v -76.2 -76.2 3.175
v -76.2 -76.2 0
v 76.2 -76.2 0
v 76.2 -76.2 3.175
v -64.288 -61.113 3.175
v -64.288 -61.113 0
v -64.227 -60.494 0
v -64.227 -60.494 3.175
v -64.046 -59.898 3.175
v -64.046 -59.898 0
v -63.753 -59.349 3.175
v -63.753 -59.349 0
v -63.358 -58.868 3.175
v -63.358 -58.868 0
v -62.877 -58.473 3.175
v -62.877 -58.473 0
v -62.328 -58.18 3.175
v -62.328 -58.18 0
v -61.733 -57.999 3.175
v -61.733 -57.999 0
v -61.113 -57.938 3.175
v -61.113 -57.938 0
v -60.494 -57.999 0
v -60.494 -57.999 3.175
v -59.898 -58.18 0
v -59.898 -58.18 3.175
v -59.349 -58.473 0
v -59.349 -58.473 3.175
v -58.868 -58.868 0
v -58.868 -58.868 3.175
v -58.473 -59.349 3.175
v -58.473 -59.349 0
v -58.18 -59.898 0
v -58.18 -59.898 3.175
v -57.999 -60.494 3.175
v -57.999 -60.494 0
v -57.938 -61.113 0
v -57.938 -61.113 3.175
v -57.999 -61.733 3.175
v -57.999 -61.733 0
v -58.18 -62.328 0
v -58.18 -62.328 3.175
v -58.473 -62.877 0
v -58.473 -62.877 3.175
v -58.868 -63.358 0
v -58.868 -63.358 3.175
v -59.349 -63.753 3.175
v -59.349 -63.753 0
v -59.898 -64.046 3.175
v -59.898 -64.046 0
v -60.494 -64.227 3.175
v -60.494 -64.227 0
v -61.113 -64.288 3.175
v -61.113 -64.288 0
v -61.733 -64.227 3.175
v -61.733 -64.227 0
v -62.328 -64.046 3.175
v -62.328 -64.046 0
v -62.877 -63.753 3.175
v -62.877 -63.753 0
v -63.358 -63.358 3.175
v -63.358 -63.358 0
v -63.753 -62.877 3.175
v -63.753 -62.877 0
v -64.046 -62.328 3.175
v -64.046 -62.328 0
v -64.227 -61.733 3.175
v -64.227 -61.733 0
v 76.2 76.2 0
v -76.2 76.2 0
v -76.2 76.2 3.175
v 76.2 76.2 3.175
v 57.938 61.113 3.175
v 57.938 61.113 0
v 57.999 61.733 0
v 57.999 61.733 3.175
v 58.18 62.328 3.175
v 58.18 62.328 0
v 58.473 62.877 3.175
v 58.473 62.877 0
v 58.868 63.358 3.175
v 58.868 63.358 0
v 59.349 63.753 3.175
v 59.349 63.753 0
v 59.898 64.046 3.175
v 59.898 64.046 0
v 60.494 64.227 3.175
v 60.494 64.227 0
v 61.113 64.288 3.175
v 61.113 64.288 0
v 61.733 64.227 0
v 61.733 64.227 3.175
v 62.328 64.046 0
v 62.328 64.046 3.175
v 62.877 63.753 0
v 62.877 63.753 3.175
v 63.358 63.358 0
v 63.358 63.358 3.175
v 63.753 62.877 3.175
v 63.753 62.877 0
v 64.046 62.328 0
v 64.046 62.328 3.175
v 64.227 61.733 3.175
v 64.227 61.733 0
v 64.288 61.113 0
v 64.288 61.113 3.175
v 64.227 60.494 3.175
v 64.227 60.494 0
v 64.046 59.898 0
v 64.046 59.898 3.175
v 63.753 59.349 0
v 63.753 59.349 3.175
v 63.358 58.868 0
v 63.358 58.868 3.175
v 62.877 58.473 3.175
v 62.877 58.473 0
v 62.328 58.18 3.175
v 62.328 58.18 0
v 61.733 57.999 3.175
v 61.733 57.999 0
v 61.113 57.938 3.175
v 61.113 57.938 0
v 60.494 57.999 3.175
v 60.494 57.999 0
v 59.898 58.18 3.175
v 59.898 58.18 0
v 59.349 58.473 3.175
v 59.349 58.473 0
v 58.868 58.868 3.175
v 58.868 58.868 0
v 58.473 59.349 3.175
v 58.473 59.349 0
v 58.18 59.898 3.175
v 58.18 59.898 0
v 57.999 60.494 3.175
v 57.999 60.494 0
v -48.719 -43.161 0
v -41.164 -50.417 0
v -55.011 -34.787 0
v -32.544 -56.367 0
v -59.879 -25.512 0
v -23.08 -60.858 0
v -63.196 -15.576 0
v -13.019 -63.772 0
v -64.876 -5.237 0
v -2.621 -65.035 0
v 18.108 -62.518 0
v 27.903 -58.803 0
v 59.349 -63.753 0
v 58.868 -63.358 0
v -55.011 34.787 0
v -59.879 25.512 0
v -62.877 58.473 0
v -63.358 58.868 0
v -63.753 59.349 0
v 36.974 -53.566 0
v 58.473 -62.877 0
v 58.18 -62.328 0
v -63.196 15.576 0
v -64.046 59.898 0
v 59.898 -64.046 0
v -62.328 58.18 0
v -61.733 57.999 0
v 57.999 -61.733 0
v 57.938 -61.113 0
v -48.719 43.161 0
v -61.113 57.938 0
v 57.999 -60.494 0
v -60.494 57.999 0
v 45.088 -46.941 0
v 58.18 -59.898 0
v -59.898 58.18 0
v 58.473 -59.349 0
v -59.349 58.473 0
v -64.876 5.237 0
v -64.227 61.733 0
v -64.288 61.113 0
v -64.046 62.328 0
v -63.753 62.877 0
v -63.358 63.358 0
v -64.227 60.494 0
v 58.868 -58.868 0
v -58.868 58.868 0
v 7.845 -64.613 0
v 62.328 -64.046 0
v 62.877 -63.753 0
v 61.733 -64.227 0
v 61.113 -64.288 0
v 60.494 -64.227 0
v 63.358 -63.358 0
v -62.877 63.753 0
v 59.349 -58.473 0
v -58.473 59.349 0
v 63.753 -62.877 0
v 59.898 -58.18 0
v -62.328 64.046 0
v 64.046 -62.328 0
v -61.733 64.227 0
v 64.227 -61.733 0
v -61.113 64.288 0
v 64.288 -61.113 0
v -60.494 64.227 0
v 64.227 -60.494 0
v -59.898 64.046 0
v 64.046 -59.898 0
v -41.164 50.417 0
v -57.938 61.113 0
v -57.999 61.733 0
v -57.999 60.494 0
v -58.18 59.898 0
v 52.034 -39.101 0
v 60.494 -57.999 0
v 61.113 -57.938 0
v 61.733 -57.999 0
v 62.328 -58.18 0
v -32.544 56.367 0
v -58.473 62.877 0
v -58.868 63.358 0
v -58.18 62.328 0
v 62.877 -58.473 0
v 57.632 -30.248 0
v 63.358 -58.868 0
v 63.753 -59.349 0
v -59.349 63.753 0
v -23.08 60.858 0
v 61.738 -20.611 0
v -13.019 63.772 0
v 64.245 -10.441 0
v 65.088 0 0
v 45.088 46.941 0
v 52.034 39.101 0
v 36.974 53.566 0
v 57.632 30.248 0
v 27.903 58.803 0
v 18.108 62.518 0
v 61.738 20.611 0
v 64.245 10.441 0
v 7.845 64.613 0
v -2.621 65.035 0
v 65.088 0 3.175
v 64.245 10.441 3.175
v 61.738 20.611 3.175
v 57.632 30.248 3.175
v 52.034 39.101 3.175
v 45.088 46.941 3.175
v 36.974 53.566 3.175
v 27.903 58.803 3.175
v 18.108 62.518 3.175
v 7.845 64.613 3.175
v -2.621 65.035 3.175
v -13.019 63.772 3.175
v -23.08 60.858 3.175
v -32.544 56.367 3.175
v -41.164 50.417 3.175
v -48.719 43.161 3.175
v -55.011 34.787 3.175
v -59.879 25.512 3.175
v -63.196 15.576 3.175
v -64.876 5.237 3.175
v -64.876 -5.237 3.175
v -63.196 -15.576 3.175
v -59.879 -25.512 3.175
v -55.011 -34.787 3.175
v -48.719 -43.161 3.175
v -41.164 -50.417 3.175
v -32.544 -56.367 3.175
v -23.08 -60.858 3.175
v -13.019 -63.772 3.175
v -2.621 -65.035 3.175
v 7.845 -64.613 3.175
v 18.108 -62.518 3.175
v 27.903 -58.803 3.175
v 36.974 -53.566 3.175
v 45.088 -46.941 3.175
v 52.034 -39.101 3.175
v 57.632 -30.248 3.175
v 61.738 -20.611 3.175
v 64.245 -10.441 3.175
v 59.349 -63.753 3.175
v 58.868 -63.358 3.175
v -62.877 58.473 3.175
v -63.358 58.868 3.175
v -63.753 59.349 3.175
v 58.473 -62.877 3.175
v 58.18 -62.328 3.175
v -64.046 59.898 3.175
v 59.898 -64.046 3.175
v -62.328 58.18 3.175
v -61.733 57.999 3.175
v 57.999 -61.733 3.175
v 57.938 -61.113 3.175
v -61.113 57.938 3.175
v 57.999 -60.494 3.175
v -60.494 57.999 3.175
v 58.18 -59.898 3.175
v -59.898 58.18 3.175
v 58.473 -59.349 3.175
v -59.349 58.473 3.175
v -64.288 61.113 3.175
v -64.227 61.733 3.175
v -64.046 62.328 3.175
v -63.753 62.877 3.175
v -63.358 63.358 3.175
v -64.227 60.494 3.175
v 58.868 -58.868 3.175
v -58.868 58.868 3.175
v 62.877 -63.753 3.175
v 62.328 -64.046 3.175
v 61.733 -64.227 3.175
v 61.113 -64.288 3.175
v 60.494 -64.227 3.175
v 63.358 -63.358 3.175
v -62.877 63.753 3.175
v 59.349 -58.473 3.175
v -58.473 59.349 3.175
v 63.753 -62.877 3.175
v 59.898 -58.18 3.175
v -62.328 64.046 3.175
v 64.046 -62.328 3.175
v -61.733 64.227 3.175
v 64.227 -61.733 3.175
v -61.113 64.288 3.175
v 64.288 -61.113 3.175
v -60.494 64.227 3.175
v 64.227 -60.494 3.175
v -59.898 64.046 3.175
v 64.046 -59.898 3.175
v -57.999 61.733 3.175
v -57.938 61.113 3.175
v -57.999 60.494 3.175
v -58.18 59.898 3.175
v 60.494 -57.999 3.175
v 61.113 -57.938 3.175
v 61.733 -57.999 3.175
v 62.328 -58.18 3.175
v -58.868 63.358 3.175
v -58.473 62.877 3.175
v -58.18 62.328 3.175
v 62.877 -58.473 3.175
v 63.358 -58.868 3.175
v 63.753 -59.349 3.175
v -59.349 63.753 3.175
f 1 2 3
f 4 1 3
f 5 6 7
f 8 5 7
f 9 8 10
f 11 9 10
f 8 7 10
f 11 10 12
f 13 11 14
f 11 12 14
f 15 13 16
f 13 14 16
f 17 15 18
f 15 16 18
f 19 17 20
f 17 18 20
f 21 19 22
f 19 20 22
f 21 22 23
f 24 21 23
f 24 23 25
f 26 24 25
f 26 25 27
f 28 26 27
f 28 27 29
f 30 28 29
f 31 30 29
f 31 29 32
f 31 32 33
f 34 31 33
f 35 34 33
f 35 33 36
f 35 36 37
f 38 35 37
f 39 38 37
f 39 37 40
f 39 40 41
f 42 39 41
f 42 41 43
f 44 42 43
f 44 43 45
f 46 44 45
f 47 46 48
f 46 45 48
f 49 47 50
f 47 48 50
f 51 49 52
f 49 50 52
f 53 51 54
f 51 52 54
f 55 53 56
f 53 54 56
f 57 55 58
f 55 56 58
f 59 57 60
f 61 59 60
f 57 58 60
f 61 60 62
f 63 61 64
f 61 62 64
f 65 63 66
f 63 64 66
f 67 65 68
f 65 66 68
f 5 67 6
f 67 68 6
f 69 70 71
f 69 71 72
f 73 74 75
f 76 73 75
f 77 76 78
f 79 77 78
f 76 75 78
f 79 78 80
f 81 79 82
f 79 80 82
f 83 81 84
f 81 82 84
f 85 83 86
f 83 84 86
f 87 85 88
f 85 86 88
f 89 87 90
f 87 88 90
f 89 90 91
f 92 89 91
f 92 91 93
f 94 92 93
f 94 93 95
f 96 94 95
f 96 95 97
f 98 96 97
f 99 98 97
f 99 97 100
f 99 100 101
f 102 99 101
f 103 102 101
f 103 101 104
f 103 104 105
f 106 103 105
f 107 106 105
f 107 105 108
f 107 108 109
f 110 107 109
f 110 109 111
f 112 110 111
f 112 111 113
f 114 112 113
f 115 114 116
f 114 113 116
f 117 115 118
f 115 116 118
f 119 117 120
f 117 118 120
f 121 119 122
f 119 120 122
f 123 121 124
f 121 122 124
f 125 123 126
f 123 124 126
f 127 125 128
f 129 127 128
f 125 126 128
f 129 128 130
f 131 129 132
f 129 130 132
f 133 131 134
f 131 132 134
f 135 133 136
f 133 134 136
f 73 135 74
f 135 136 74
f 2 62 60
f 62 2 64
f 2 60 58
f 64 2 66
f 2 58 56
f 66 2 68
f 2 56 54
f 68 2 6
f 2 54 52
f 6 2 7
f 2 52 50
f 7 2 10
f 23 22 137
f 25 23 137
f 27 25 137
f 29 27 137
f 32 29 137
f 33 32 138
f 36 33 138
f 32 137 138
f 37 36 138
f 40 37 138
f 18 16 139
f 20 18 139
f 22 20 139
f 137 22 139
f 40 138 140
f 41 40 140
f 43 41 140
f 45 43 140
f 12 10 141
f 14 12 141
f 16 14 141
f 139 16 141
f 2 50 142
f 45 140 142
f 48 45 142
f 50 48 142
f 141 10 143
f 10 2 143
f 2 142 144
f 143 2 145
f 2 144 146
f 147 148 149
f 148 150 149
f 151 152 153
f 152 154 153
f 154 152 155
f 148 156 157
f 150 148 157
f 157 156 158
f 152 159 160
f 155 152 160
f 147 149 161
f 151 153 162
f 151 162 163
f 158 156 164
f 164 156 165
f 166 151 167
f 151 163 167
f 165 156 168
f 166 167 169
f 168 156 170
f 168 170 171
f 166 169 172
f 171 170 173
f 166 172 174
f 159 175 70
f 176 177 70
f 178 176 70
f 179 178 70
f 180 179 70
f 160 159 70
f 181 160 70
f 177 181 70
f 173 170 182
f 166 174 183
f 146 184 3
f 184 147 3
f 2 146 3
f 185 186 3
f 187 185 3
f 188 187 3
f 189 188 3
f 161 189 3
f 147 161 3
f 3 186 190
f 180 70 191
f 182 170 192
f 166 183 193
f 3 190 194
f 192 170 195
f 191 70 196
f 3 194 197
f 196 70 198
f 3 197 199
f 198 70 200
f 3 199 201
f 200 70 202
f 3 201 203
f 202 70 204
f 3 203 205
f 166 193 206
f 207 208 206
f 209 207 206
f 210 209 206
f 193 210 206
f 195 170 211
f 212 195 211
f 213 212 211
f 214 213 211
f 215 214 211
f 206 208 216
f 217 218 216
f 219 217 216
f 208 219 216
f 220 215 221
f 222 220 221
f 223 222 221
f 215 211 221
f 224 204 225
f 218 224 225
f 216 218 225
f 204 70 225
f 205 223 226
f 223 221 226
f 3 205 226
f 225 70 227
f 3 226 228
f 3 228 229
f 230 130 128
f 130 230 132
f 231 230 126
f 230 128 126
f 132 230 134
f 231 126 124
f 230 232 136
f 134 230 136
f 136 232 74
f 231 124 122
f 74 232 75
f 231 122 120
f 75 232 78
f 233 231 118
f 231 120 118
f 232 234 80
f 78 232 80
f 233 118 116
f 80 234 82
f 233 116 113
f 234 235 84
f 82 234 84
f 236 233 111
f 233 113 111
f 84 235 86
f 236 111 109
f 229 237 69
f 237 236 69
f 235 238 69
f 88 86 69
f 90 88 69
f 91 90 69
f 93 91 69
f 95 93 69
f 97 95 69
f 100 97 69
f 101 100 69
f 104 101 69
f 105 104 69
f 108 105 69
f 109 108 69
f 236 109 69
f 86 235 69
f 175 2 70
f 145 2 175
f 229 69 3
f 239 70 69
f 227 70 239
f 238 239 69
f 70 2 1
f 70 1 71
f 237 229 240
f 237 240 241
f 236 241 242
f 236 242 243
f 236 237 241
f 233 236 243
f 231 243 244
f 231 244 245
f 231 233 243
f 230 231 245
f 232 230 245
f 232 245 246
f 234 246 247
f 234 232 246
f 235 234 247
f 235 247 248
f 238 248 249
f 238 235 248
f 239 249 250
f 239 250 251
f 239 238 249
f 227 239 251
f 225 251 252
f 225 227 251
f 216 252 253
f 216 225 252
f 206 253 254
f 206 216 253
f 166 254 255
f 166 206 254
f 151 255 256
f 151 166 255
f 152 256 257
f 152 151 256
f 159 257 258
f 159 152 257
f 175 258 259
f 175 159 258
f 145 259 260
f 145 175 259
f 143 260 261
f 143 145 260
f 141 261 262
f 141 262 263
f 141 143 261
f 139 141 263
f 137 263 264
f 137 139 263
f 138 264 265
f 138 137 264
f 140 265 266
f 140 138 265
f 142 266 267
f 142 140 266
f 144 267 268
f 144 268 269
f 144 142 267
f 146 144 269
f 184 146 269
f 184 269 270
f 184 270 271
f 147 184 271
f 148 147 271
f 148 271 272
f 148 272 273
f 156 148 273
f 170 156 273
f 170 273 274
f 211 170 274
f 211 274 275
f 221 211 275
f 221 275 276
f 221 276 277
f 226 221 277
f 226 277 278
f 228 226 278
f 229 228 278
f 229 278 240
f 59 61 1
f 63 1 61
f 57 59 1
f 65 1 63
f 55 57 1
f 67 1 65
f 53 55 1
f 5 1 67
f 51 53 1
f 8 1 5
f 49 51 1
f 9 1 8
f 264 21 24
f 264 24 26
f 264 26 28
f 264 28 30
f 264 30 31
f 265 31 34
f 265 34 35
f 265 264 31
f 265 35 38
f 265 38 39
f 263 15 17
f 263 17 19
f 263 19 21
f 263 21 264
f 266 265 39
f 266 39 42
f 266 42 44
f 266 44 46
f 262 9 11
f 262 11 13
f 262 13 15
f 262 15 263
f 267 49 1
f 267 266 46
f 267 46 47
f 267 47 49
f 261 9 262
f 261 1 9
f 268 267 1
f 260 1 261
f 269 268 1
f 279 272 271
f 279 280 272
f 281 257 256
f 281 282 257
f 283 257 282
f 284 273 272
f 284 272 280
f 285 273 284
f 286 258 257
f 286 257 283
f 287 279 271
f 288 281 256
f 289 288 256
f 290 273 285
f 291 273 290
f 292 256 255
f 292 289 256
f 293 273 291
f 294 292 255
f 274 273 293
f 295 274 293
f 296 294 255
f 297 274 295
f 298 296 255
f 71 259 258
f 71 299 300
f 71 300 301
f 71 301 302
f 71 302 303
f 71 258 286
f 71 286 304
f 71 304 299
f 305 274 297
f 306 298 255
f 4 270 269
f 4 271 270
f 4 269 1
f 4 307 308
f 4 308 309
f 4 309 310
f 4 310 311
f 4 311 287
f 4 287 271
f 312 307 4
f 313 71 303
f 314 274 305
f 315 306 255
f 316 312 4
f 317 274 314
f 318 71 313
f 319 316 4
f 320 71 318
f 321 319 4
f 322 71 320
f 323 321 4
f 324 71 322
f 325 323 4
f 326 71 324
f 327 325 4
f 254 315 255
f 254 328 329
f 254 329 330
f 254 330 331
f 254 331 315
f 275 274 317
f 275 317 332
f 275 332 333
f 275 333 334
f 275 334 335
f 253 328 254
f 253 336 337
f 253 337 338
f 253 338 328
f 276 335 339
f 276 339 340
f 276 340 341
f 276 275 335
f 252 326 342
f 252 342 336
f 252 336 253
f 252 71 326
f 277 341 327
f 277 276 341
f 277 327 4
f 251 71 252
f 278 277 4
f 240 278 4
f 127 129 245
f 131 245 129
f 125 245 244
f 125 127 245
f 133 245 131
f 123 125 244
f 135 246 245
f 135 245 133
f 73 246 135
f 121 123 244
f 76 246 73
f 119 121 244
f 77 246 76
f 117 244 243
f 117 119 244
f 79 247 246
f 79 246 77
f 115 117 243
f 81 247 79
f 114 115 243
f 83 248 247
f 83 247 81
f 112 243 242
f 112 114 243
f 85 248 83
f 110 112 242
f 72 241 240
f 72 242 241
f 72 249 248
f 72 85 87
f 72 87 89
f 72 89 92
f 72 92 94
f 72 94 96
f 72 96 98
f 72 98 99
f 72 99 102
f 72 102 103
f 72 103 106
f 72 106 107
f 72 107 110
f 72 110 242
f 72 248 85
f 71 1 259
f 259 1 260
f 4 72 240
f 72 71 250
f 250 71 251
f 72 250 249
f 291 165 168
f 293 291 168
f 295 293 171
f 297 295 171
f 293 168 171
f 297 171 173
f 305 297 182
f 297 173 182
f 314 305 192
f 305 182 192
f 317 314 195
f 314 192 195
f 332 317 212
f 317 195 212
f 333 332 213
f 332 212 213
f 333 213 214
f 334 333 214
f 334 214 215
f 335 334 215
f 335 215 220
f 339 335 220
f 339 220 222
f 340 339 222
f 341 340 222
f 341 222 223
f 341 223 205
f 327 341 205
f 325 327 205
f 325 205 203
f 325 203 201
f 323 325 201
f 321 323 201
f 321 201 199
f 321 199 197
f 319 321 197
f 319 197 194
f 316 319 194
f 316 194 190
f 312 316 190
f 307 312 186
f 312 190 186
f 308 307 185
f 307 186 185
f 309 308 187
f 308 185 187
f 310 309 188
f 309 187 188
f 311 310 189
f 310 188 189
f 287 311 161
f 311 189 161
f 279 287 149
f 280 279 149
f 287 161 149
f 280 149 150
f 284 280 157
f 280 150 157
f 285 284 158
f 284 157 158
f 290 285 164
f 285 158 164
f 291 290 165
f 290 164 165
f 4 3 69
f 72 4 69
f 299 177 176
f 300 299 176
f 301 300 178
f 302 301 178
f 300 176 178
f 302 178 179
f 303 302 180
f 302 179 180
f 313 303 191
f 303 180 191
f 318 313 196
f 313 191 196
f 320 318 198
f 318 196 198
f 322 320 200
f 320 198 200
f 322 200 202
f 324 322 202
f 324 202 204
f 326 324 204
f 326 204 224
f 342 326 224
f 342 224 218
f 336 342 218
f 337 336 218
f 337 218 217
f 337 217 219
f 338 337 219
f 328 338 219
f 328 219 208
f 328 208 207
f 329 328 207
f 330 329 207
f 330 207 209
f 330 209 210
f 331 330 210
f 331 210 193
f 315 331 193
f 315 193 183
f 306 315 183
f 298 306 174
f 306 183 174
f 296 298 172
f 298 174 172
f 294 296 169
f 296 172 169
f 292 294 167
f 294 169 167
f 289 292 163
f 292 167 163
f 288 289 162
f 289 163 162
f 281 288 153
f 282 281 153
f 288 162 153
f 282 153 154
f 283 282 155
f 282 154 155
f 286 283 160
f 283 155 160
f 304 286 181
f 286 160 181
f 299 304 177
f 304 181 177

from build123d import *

# Parameters (mm, degrees)
F0_W     = 152.4
F0_H     = 152.4
F0_R     = 65.0875
F1_DEPTH = 3.175
F3_D     = 6.35


with BuildPart() as f1:
    # F0 (on Top) → F1 (new body)
    with BuildSketch(Plane.XY):
        Rectangle(F0_W, F0_H)
        Circle(F0_R, mode=Mode.SUBTRACT)
    extrude(amount=F1_DEPTH)

    # F3 (through all)
    with Locations(Plane.XY.offset(3.175)):
        with Locations((-61.11317, -61.11317), (61.11317, -61.11317), (61.11317, 61.11317), (-61.11317, 61.11317)):
            Hole(F3_D / 2)


solid = f1.part
